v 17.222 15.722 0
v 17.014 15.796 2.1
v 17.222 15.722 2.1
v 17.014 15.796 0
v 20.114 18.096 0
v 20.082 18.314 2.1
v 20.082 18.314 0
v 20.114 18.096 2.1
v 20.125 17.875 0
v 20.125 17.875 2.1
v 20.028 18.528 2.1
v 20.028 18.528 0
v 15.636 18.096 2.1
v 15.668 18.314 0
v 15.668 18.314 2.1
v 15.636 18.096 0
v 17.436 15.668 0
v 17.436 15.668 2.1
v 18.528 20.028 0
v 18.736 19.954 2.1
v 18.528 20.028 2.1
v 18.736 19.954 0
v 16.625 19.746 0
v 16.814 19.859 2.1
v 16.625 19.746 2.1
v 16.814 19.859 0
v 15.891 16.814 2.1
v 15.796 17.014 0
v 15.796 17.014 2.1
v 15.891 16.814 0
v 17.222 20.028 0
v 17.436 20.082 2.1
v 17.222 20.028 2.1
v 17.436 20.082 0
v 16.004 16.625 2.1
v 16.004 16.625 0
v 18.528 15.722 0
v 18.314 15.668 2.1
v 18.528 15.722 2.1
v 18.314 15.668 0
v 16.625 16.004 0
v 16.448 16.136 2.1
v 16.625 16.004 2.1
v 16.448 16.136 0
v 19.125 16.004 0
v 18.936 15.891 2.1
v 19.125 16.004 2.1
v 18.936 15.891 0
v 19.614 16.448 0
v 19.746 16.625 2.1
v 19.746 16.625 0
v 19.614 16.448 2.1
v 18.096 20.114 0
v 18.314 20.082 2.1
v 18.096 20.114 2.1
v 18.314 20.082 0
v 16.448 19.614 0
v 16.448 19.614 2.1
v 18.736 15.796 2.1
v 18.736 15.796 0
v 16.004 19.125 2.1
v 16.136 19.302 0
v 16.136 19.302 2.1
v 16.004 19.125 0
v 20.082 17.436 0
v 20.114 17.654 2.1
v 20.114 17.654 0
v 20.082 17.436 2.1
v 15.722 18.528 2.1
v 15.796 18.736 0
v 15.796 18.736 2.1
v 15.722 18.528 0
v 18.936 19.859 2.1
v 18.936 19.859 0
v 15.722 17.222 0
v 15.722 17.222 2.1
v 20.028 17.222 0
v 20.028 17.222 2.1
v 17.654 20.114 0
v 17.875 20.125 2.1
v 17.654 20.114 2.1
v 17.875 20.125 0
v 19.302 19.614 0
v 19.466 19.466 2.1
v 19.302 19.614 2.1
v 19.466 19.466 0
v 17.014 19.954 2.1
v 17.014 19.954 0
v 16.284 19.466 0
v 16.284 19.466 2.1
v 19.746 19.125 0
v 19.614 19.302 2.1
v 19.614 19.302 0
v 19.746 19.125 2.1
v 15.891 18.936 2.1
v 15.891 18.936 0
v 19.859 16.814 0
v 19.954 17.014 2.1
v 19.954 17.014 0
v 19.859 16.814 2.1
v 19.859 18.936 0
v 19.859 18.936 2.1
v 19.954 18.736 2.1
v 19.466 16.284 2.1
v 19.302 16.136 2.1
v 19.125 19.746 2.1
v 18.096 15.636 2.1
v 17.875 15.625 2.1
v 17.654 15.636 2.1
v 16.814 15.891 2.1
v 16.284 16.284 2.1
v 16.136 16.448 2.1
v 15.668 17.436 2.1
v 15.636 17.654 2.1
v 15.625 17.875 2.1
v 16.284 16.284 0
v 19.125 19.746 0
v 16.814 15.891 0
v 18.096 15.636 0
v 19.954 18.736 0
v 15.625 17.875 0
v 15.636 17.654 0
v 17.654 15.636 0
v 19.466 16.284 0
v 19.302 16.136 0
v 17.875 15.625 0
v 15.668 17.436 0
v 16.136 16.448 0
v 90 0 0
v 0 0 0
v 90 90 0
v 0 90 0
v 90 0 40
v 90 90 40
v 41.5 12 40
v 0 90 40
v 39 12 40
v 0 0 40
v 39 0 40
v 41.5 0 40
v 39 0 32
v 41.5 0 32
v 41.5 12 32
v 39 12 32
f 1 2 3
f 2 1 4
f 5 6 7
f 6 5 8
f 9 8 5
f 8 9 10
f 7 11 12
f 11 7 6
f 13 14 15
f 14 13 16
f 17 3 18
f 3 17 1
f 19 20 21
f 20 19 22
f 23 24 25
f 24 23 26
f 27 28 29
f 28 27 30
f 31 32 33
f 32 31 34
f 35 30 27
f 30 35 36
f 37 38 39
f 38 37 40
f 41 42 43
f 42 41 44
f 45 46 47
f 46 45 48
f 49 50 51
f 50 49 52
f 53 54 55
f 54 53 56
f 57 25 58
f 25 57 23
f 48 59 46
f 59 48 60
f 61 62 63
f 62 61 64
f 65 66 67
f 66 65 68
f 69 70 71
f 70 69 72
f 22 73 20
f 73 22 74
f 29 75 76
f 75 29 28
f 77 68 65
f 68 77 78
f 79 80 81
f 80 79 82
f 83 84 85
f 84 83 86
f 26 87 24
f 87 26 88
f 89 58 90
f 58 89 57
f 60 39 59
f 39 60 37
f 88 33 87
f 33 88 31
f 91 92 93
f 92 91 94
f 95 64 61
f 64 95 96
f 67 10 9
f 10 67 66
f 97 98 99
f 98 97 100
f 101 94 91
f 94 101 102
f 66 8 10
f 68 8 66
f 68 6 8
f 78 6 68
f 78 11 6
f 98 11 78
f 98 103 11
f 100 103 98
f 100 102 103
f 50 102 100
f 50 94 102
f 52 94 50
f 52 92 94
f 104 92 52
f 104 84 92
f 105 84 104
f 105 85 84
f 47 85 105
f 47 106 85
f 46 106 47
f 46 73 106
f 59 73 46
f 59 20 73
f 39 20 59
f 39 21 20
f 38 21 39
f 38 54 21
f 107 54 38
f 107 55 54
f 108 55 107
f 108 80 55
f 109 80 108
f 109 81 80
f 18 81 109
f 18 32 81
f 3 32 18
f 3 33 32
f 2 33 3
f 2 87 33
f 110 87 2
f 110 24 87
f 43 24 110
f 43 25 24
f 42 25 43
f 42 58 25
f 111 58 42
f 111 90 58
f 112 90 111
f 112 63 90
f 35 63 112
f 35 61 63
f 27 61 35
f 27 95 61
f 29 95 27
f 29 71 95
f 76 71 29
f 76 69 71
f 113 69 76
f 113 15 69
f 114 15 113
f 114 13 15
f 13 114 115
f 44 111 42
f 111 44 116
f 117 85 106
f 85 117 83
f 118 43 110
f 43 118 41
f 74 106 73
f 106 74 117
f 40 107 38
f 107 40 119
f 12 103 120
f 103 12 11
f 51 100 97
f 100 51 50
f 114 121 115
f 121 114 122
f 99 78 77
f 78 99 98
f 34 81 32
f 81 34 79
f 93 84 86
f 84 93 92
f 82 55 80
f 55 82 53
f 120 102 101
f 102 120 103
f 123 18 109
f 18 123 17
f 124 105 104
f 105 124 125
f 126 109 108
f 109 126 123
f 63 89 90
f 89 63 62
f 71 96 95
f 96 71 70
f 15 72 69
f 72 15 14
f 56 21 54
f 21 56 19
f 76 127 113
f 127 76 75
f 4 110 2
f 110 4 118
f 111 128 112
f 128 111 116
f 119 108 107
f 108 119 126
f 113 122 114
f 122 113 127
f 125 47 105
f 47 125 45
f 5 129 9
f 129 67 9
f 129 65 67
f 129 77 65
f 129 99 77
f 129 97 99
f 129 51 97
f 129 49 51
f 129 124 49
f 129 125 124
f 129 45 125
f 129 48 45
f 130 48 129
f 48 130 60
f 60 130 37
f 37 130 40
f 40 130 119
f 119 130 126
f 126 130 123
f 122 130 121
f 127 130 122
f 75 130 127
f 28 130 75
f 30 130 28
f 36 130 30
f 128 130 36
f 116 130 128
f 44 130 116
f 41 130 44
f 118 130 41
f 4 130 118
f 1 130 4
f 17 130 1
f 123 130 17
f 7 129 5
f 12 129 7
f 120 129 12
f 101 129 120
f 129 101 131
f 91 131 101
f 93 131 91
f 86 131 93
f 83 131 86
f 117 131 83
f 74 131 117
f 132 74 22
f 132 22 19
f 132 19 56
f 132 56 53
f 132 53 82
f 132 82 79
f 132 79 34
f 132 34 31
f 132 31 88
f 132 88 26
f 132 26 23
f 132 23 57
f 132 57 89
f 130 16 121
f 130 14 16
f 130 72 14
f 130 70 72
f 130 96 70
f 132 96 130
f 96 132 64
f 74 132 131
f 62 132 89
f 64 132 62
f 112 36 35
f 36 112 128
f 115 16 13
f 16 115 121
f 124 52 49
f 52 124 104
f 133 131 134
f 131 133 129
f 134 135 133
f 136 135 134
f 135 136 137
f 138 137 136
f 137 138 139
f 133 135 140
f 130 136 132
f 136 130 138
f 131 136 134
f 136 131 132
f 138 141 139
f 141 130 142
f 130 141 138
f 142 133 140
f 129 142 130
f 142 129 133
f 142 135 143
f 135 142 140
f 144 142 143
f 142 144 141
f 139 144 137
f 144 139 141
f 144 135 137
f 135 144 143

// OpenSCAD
// DIY Magnetic Stirrer Housing
// Based on an 80mm PC case fan
// Print orientation: Upside down (Top plate on bed, walls rising up)

// --- Dimensions ---
// Outer size of the housing
W = 90;
H = 90;

// Thickness of the top plate (resting on bed)
T_TOP = 2;

// Height of the walls (total height of the part)
WALL_HEIGHT = 40;

// Wall thickness
WALL_THICK = 2.5;

// Hole specifications
HOLE_DIAM = 4.5;
HOLE_PATTERN_SIZE = 71.5; // Distance between hole centers
HOLE_COUNT = 4;

// Cable notch specifications
NOTCH_WIDTH = 12;
NOTCH_DEPTH_FROM_TOP = 8; // Distance from the open edge (z=40) down to z=32

// --- Main Body Construction ---
// We build the solid block first, then subtract holes and notches.
// The base is the top plate, walls rise from it.
// Total height must be exactly WALL_HEIGHT (40mm) to match the spec.

difference() {
    // 1. The Main Block
    // Dimensions: W x H x WALL_HEIGHT
    // Centered at origin.
    // Since it rests on Z=0, the block goes from Z=0 to Z=WALL_HEIGHT.
    block_size = [W, H, WALL_HEIGHT];
    
    union() {
        cube(block_size);
    }
    
    // 2. Cut the 4 Screw Holes through the top plate
    // Pattern: 71.5mm square centered on the plate.
    // Plate center is (0,0).
    // Holes are at +/- 35.75mm in X and Y.
    // We iterate to create the 4 holes.
    for (i = [0, 1]) {
        for (j = [0, 1]) {
            // Calculate position: 
            // i=0 -> -35.75, i=1 -> +35.75
            translate([
                (HOLE_PATTERN_SIZE / 2) * (i - 0.5),
                (HOLE_PATTERN_SIZE / 2) * (j - 0.5),
                0 // Start cutting from bottom of top plate
            ]) {
                // Cut a cylinder through the top plate only (depth = T_TOP)
                // Extend slightly past the face to ensure clean cut
                cylinder(
                    h = T_TOP + 0.1, 
                    d = HOLE_DIAM,
                    $fn = 64
                );
            }
        }
    }
    
    // 3. Cut the Cable Notch
    // Location: In one wall. Let's choose the wall at X = +W/2 (Right wall).
    // The notch is 12mm wide (along Y), centered along the wall.
    // The wall runs from Y = -H/2 to Y = +H/2.
    // Center of wall in Y is 0.
    // Notch reaches 8mm down from the open edge (Z=40).
    // So it cuts from Z = 40 - 8 = 32 to Z = 40.
    
    translate([
        W/2 - NOTCH_WIDTH/2, // X position: Center of the right wall
        0,                   // Y position: Centered along the wall
        32                   // Z position: Start of the cut (8mm up from bed)
    ]) {
        // Cut a rectangular prism for the notch
        // Width (Y) = NOTCH_WIDTH
        // Height (Z) = NOTCH_DEPTH_FROM_TOP (8mm)
        // Depth (X) = WALL_THICK (to cut through the wall)
        cube([WALL_THICK, NOTCH_WIDTH, NOTCH_DEPTH_FROM_TOP]);
    }
}
